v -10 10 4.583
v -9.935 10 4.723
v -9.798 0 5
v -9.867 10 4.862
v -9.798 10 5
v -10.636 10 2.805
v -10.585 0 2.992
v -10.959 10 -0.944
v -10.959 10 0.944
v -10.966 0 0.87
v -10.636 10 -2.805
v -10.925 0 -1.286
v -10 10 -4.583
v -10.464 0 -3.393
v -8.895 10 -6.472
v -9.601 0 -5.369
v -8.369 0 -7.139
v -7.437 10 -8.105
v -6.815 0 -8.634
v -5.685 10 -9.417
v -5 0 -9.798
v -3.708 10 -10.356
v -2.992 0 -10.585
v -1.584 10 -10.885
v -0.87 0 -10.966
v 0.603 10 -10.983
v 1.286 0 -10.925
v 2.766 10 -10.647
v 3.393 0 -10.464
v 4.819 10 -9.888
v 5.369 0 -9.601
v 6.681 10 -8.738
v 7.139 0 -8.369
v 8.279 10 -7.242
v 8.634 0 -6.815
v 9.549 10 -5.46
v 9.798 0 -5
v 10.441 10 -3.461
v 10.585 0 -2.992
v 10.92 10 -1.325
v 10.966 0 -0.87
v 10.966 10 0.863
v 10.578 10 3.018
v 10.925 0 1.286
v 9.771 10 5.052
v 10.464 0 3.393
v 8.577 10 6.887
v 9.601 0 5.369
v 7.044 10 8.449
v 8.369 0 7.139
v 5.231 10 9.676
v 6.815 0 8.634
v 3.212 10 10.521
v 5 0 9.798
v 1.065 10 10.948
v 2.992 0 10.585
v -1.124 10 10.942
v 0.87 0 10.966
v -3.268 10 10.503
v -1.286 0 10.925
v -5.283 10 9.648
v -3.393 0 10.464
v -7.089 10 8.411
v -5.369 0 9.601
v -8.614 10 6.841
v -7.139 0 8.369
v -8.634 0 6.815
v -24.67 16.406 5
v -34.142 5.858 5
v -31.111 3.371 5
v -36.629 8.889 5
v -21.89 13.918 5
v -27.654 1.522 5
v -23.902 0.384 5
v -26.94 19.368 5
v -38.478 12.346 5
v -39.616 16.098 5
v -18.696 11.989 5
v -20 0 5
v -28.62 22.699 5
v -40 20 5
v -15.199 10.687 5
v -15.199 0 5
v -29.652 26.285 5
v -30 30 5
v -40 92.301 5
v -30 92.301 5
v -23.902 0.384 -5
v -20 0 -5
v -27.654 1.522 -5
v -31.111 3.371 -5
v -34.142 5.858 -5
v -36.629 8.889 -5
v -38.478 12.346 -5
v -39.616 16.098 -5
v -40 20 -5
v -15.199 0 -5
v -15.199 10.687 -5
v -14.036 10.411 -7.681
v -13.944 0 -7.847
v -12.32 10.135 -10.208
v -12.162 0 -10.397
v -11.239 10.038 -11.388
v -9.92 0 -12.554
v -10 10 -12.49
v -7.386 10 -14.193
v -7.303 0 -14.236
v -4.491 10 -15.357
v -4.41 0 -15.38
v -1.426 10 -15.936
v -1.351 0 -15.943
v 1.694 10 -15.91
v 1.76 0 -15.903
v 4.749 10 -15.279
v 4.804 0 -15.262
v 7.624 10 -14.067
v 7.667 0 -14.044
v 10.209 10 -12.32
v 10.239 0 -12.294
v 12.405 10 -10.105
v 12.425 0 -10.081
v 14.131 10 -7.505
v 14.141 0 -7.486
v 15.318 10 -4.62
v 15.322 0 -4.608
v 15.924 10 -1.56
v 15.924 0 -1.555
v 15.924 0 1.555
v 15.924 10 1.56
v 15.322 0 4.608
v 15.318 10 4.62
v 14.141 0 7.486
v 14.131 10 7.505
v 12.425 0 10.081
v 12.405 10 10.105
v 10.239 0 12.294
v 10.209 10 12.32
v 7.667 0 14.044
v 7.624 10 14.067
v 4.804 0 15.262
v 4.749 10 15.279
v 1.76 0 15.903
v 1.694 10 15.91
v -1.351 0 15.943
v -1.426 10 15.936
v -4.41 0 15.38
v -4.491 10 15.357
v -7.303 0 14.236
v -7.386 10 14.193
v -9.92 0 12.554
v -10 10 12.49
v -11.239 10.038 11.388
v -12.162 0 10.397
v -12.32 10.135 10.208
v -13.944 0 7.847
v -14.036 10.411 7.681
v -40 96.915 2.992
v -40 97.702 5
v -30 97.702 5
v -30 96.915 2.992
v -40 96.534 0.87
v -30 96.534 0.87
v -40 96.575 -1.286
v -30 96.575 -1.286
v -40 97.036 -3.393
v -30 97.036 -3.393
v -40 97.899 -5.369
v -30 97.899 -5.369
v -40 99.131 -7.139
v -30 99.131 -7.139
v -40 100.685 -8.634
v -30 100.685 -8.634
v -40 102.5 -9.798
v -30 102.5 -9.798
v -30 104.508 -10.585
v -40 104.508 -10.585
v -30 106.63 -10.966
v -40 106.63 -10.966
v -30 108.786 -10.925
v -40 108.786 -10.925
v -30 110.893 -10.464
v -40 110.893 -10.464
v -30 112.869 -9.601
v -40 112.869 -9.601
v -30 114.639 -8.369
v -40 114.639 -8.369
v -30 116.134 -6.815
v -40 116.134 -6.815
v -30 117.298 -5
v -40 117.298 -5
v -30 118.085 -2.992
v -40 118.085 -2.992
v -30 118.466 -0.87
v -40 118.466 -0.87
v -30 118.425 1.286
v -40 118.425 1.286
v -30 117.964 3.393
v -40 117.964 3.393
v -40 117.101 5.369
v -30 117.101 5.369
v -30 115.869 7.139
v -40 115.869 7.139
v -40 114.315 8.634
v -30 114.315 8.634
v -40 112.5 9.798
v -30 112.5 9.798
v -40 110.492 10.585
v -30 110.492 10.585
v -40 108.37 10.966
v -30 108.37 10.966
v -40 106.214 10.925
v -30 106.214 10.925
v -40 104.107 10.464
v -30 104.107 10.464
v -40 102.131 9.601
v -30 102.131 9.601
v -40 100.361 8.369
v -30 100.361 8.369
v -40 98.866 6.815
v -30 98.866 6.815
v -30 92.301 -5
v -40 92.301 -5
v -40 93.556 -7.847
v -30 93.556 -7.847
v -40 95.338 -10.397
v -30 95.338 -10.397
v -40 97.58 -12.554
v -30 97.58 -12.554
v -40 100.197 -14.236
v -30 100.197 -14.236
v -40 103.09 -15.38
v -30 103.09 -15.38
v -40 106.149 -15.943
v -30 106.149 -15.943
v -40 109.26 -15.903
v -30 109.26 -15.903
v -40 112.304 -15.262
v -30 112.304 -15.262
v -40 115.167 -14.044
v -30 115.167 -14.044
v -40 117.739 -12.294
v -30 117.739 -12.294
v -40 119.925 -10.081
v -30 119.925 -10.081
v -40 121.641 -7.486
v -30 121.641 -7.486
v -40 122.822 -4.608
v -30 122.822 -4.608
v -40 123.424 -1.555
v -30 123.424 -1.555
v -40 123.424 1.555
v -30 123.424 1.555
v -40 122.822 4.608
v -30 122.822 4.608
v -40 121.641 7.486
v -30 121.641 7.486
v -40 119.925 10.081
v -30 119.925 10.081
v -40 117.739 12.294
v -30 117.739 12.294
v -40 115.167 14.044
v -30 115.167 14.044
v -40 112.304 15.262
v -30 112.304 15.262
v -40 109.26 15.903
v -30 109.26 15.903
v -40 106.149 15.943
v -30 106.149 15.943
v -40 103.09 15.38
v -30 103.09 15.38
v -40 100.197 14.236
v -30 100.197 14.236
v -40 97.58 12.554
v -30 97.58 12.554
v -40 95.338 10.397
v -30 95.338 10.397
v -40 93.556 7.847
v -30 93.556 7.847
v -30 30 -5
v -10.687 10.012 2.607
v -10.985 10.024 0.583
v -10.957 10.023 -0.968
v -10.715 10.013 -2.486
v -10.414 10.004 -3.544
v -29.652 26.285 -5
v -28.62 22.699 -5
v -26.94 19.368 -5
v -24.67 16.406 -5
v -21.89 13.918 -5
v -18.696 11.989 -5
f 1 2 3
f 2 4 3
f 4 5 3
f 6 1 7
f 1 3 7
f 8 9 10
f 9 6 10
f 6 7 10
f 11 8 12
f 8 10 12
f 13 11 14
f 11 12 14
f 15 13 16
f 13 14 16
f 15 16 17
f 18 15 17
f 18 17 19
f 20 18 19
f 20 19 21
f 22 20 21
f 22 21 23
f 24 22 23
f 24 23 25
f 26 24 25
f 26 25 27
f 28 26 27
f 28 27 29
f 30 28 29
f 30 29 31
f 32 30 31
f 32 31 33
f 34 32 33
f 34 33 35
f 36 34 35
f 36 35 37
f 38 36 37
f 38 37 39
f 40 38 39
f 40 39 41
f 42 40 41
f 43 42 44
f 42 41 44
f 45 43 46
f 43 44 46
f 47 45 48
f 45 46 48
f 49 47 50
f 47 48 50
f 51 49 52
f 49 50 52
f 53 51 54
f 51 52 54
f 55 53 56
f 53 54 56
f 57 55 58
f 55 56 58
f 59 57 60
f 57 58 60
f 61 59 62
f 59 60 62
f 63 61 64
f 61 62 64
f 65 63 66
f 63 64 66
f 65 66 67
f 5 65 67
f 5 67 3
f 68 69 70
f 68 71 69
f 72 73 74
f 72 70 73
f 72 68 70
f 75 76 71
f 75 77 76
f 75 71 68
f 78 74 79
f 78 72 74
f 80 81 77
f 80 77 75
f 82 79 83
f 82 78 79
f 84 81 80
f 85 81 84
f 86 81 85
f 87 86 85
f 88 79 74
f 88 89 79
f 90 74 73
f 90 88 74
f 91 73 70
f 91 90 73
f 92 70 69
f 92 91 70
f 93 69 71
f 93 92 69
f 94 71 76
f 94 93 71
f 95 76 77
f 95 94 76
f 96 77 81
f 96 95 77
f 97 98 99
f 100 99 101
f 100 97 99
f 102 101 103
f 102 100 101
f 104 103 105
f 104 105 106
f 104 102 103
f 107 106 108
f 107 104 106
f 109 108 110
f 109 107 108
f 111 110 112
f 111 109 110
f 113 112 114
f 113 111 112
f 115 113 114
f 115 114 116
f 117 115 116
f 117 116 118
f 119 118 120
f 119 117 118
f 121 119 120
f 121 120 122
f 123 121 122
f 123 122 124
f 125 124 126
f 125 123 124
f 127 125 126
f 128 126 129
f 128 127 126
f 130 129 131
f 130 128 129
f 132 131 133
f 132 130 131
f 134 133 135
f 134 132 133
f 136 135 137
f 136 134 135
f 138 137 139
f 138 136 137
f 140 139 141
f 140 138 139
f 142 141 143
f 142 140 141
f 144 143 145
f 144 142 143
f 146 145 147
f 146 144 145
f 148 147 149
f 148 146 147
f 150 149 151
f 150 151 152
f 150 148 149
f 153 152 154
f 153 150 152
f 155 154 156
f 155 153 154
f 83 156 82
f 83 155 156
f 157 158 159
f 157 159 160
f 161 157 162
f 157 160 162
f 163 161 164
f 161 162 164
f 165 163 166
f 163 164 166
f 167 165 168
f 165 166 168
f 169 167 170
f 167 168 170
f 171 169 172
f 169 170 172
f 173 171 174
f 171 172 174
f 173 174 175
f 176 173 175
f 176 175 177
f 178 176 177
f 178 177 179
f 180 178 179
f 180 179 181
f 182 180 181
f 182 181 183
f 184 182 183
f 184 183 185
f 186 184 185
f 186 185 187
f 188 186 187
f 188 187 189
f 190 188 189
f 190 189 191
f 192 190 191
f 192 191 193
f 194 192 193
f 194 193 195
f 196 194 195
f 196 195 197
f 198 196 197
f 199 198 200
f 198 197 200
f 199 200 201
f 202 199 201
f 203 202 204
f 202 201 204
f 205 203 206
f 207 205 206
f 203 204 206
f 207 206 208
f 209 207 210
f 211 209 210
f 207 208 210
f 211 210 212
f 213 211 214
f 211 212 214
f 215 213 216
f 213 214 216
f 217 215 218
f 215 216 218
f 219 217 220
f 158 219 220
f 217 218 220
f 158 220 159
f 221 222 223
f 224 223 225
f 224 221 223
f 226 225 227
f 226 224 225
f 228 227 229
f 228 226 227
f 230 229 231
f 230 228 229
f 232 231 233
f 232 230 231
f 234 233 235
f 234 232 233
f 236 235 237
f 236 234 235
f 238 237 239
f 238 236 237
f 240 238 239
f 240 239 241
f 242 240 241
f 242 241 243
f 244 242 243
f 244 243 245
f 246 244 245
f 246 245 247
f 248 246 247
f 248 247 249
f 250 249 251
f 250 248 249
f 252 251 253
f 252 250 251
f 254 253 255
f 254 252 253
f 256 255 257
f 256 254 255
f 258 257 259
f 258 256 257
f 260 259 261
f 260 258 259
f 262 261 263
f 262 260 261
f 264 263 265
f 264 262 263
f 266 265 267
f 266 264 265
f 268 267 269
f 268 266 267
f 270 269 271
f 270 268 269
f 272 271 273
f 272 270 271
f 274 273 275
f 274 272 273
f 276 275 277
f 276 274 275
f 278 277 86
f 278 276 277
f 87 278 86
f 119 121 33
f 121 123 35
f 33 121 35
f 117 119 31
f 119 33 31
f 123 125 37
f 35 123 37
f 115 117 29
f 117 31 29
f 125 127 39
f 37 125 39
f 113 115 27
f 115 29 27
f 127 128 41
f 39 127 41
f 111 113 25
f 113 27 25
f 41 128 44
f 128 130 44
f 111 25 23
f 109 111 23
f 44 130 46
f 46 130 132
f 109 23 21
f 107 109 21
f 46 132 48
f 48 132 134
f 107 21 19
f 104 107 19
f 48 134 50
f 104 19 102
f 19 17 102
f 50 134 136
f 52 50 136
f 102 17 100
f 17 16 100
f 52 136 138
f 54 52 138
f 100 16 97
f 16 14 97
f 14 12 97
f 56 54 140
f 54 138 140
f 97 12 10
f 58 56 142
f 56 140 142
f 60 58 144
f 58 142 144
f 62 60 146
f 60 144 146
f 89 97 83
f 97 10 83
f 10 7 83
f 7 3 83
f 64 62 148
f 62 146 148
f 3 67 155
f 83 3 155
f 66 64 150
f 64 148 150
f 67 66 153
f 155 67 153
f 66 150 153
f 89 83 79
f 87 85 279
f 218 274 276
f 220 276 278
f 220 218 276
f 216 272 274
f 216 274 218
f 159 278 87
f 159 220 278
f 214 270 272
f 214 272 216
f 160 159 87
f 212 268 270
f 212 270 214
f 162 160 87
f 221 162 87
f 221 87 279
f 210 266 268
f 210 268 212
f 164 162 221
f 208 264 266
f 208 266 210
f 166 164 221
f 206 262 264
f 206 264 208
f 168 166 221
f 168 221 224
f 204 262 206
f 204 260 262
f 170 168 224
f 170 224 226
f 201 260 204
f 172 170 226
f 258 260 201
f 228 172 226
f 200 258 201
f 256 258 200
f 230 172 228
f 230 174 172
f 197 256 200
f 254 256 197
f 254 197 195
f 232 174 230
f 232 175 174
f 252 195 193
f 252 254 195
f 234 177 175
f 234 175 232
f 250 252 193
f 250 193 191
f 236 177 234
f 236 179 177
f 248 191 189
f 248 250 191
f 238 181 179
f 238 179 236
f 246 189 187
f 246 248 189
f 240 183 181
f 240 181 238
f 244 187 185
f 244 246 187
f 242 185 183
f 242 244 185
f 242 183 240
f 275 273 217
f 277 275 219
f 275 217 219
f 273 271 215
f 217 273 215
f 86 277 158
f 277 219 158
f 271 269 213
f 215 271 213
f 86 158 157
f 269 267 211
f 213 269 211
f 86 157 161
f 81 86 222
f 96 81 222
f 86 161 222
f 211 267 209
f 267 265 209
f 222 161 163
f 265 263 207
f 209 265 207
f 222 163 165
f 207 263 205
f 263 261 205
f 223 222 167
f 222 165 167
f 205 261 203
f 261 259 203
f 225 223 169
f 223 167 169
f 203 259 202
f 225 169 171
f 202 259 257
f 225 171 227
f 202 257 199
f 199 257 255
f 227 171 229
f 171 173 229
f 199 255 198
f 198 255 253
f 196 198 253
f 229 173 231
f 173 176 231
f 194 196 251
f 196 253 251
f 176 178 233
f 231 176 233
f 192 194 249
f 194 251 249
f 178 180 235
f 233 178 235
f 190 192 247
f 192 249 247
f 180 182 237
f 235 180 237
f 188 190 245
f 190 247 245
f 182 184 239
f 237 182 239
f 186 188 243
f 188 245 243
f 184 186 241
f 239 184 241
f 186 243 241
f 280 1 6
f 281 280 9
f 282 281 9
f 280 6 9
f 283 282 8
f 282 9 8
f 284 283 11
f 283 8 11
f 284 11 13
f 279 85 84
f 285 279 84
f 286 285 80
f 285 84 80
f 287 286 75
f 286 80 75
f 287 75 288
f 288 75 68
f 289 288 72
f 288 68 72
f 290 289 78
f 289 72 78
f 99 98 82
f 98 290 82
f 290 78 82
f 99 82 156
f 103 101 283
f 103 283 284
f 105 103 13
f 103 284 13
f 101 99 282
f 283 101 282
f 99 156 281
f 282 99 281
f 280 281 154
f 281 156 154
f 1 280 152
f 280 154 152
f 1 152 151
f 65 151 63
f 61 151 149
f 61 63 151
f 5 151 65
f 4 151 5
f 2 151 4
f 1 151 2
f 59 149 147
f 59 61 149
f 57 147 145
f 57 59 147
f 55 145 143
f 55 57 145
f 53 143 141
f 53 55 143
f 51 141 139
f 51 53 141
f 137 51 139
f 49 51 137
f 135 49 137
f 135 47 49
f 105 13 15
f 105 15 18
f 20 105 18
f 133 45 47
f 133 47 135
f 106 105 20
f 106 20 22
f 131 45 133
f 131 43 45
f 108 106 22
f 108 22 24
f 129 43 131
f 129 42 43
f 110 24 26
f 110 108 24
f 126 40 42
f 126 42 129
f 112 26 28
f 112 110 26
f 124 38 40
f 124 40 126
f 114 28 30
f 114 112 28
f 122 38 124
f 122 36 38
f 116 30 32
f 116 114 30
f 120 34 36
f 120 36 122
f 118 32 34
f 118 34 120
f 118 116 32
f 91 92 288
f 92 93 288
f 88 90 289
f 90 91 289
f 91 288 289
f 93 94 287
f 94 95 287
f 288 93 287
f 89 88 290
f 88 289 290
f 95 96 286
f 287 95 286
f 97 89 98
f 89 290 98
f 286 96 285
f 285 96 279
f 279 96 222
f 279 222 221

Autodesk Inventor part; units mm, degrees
ref_plane "YZ Plane" through (0, 0, 0) normal (1, 0, 0) x (0, 1, 0)
ref_plane "XZ Plane" through (0, 0, 0) normal (0, 1, 0) x (-1, 0, 0)
ref_plane "XY Plane" through (0, 0, 0) normal (0, 0, 1) x (1, 0, 0)
sketch "Szkic2" plane through (0, 0, 0) normal (0, 1, 0) x (-1, 0, 0)
  circle A0 centre (0, 0) radius 11
  circle A1 centre (0, 0) radius 16
  dimension "d0" = 22
  dimension "d1" = 5
extrude "Wyciągnięcie proste1" add sketch "Szkic2" along normal blind 10
sketch "Szkic4" plane through (0, 0, 0) normal (0, 0, 1) x (1, 0, 0)
  line L0 (0, 0) -> (-30, 0)
  line L1 (-30, 0) -> (-30, 10)
  line L2 (-30, 10) -> (0, 10)
  line L3 (0, 10) -> (0, 0)
  line L4 (-30, 0) -> (-40, 0)
  line L5 (-40, 0) -> (-40, 107.5)
  line L6 (-40, 107.5) -> (-30, 107.5)
  line L7 (-30, 107.5) -> (-30, 0)
  dimension "d7" = 107.5
  dimension "d8" = 30
  dimension "d9" = 10
  dimension "d10" = 10
extrude "Wyciągnięcie proste2" add sketch "Szkic4" along normal mid plane 10
fillet "Zaokrąglenie1" radius 20 2 edges at (-40, 0, 0) (-30, 10, 0)
sketch "Szkic7" plane through (-30, 107.5, 5) normal (1, 0, 0) x (0, 0, -1)
  line L0 (10, 0) -> (0, 0) projected
  circle A0 centre (5, 0) radius 11
  circle A1 centre (5, 0) radius 16
  point P0 (5, -107.5)
  dimension "d14" = 22
  dimension "d15" = 32
extrude "Wyciągnięcie proste3" add sketch "Szkic7" against normal blind 10
sketch "Szkic8" plane through (0, 10, 0) normal (0, 1, 0) x (1, 0, 0)
  circle A0 centre (0, 0) radius 11
extrude "Wyciągnięcie proste4" cut sketch "Szkic8" against normal blind 10
sketch "Szkic9" plane through (0, 10, 0) normal (0, -1, 0) x (1, 0, 0)
  circle A0 centre (0, 0) radius 11
extrude "Wyciągnięcie proste5" cut sketch "Szkic9" against normal blind 10
sketch "Szkic11" plane through (-30, 30, 5) normal (1, 0, 0) x (0, 0, -1)
  line L0 (10, 77.5) -> (0, 77.5) projected
  circle A0 centre (5, 77.5) radius 11
  point P0 (5, -30)
extrude "Wyciągnięcie proste6" cut sketch "Szkic11" against normal blind 10
properties part number "Gora-srodek-ramie"
